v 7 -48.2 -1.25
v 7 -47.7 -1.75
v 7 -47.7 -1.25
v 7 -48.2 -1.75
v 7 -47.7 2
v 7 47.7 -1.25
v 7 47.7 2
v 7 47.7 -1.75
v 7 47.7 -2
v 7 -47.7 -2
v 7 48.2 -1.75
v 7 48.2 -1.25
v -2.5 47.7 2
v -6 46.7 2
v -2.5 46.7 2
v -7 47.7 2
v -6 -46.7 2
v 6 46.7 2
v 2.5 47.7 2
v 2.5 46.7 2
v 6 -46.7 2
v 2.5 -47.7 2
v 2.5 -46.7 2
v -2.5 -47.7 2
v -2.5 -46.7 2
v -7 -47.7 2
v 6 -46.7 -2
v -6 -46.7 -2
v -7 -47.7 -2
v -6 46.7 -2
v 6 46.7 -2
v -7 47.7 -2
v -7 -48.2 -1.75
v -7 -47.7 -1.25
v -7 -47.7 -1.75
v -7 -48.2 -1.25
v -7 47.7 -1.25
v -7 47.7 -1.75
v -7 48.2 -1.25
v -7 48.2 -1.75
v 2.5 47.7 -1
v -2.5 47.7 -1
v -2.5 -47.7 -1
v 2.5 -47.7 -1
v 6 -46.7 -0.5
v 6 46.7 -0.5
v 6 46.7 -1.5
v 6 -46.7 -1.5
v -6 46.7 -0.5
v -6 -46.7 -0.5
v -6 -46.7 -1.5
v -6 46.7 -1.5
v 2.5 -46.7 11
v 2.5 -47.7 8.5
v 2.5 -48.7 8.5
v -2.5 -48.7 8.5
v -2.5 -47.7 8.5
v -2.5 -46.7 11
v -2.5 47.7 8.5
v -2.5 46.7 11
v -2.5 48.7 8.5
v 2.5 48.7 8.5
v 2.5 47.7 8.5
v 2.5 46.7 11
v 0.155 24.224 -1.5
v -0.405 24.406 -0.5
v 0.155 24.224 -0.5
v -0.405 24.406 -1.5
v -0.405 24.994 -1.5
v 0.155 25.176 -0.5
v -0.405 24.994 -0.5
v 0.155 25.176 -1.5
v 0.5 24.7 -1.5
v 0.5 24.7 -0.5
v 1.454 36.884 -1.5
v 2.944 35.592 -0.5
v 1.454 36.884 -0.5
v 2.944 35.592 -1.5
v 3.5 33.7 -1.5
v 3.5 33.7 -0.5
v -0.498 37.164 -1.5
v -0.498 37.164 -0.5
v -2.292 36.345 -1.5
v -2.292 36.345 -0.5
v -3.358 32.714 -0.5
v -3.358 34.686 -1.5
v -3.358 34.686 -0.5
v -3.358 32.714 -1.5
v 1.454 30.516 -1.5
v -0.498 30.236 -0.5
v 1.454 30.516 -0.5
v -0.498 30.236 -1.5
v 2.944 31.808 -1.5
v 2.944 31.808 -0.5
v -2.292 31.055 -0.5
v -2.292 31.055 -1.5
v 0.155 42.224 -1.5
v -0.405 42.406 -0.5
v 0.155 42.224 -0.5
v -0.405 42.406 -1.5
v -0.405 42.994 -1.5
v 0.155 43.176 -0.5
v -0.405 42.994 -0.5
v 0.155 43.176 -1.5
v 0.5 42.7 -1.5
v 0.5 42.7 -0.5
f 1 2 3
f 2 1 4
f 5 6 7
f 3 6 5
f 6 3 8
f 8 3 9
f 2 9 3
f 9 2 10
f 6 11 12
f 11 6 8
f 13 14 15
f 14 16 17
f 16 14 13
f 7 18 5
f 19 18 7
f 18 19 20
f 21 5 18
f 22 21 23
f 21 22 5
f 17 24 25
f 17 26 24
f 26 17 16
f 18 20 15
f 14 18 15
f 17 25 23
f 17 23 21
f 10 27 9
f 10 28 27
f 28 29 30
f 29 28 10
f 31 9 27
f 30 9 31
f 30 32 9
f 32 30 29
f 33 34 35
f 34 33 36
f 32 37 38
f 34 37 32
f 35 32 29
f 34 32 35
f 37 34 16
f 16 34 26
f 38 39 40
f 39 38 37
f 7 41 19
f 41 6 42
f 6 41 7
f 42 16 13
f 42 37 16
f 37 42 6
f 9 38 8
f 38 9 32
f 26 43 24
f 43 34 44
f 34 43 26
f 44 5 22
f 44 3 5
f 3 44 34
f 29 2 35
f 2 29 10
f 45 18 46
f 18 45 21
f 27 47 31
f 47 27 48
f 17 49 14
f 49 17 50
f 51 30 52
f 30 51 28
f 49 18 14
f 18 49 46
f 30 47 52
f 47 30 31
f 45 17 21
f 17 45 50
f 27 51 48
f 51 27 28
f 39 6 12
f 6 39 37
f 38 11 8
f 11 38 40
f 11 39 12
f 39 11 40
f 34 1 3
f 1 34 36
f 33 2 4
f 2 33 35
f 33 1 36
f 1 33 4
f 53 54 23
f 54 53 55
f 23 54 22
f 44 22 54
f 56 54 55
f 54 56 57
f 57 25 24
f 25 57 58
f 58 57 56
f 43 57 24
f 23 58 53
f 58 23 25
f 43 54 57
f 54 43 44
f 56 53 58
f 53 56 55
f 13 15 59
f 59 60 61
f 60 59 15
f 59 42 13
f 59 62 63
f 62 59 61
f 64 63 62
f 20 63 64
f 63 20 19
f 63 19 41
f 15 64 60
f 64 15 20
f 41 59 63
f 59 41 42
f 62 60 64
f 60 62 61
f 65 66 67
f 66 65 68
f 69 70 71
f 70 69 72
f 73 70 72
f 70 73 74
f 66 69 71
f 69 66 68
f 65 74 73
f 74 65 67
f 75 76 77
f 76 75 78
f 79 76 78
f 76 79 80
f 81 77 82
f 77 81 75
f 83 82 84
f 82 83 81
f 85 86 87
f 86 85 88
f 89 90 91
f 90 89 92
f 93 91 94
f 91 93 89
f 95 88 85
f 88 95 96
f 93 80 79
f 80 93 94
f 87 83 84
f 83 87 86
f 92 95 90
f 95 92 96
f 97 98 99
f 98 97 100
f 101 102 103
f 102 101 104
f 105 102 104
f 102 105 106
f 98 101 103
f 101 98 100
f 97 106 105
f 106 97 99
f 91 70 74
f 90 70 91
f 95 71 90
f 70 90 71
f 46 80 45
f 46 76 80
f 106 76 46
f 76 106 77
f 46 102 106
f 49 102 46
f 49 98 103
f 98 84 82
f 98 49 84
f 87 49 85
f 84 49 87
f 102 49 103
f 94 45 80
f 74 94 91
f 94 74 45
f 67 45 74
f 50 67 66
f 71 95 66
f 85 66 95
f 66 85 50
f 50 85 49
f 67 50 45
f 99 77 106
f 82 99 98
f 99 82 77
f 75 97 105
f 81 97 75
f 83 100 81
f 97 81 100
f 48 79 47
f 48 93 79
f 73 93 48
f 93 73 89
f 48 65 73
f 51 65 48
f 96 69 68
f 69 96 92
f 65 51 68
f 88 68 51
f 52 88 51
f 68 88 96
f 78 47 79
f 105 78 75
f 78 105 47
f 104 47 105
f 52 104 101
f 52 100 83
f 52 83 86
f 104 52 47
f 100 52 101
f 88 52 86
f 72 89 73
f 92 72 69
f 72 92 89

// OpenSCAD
width=95.4;               //width for bay
height=14;                //height for bay
depth=4;                  //depth (height as printed) for rim wall

wallthick=1;              //thickness for all walls

wflange=1;                //flange extra width on sides
flangeoffset=0.5;         //offset from front plate
flangethickness=0.5;      //thickness for flange

//clip dimensions
clipwidth=5;
clipthick=wallthick;       //total width for upright
clipheight=12;              //total height
retainerthick=wallthick*2; //total width for overhang
retainerheightinclip=2.5;  //total height for slope part.

module originalrim(){
  difference(){
    cube( [height,width,depth], center=true );
    cube( [height-(wallthick*2),width-(wallthick*2),depth+2], center=true );
  }
}

module baseplate(){
  translate([0,0,-depth/2+wallthick])
    cube( [height,width,wallthick], center=true );
}

module flanges(){
  translate( [0,width/2,-(depth/2)+flangeoffset] )
    cube( [height,wflange,flangethickness], center=true );
  translate( [0,-width/2,-(depth/2)+flangeoffset] )
    cube( [height,wflange,flangethickness], center=true );   
}

module prism(l, w, h){
  //centered.
  translate([-l/2,-w/2,-h/2])
     polyhedron(
             points=[[0,0,0], [l,0,0], [l,w,0], [0,w,0], [0,w,h], [l,w,h]],
             faces=[[0,1,2,3],[5,4,3,2],[0,4,5,1],[0,3,4],[5,2,1]]
             );
}

//a single retention clip
module clip(){
  translate([0,0,-retainerheightinclip/2 ]){
    cube( [clipwidth,clipthick,clipheight-retainerheightinclip], center=true );
    translate( [0,-retainerthick/2+clipthick/2,(clipheight-retainerheightinclip)/2 + (retainerheightinclip/2)] )
      prism(clipwidth,retainerthick,retainerheightinclip);
  }
}

module leftclip(){
  clip();
}
module rightclip(){
  rotate([0,0,180])
    clip();
}

module clips(){
  translate([0,-width/2 + retainerthick/2 - clipthick/2 , clipheight/2 - depth/2 + wallthick]) color("red") leftclip();
  translate([0,width/2 - retainerthick/2 + clipthick/2 , clipheight/2 - depth/2 + wallthick]) color("red") rightclip();
}


//mounting for a barreljack.. 
screwmountdistance = 18; //separation for screw holes
screwmountradius=1/2;    //radius for screw holes
barrelradius = 7/2;      //radius for barreljack (centered between screwholes)
module powersocketstamp(){
  translate([0,-screwmountdistance/2,-wallthick/2]){
    translate([0,0,0])
      cylinder(r=screwmountradius,h=wallthick*3,center=true);
    translate([0,screwmountdistance/2,0])
      cylinder(r=barrelradius,h=wallthick*3,center=true);
    translate([0,screwmountdistance,0])
      cylinder(r=screwmountradius,h=wallthick*3,center=true);  
  }
}

//edge wall
originalrim();
//pointless original detail
flanges();
//retentionclips
clips();
//baseplate, punched out for barreljack. (just use baseplate(); if you dont want barreljack)
difference(){
  baseplate();
  //move the barrel jack over to one edge (remove translate to leave centered)
  translate([0,(width-(wallthick*10))/screwmountdistance * (screwmountdistance/2) - (screwmountdistance/2),0])
    powersocketstamp();
}
